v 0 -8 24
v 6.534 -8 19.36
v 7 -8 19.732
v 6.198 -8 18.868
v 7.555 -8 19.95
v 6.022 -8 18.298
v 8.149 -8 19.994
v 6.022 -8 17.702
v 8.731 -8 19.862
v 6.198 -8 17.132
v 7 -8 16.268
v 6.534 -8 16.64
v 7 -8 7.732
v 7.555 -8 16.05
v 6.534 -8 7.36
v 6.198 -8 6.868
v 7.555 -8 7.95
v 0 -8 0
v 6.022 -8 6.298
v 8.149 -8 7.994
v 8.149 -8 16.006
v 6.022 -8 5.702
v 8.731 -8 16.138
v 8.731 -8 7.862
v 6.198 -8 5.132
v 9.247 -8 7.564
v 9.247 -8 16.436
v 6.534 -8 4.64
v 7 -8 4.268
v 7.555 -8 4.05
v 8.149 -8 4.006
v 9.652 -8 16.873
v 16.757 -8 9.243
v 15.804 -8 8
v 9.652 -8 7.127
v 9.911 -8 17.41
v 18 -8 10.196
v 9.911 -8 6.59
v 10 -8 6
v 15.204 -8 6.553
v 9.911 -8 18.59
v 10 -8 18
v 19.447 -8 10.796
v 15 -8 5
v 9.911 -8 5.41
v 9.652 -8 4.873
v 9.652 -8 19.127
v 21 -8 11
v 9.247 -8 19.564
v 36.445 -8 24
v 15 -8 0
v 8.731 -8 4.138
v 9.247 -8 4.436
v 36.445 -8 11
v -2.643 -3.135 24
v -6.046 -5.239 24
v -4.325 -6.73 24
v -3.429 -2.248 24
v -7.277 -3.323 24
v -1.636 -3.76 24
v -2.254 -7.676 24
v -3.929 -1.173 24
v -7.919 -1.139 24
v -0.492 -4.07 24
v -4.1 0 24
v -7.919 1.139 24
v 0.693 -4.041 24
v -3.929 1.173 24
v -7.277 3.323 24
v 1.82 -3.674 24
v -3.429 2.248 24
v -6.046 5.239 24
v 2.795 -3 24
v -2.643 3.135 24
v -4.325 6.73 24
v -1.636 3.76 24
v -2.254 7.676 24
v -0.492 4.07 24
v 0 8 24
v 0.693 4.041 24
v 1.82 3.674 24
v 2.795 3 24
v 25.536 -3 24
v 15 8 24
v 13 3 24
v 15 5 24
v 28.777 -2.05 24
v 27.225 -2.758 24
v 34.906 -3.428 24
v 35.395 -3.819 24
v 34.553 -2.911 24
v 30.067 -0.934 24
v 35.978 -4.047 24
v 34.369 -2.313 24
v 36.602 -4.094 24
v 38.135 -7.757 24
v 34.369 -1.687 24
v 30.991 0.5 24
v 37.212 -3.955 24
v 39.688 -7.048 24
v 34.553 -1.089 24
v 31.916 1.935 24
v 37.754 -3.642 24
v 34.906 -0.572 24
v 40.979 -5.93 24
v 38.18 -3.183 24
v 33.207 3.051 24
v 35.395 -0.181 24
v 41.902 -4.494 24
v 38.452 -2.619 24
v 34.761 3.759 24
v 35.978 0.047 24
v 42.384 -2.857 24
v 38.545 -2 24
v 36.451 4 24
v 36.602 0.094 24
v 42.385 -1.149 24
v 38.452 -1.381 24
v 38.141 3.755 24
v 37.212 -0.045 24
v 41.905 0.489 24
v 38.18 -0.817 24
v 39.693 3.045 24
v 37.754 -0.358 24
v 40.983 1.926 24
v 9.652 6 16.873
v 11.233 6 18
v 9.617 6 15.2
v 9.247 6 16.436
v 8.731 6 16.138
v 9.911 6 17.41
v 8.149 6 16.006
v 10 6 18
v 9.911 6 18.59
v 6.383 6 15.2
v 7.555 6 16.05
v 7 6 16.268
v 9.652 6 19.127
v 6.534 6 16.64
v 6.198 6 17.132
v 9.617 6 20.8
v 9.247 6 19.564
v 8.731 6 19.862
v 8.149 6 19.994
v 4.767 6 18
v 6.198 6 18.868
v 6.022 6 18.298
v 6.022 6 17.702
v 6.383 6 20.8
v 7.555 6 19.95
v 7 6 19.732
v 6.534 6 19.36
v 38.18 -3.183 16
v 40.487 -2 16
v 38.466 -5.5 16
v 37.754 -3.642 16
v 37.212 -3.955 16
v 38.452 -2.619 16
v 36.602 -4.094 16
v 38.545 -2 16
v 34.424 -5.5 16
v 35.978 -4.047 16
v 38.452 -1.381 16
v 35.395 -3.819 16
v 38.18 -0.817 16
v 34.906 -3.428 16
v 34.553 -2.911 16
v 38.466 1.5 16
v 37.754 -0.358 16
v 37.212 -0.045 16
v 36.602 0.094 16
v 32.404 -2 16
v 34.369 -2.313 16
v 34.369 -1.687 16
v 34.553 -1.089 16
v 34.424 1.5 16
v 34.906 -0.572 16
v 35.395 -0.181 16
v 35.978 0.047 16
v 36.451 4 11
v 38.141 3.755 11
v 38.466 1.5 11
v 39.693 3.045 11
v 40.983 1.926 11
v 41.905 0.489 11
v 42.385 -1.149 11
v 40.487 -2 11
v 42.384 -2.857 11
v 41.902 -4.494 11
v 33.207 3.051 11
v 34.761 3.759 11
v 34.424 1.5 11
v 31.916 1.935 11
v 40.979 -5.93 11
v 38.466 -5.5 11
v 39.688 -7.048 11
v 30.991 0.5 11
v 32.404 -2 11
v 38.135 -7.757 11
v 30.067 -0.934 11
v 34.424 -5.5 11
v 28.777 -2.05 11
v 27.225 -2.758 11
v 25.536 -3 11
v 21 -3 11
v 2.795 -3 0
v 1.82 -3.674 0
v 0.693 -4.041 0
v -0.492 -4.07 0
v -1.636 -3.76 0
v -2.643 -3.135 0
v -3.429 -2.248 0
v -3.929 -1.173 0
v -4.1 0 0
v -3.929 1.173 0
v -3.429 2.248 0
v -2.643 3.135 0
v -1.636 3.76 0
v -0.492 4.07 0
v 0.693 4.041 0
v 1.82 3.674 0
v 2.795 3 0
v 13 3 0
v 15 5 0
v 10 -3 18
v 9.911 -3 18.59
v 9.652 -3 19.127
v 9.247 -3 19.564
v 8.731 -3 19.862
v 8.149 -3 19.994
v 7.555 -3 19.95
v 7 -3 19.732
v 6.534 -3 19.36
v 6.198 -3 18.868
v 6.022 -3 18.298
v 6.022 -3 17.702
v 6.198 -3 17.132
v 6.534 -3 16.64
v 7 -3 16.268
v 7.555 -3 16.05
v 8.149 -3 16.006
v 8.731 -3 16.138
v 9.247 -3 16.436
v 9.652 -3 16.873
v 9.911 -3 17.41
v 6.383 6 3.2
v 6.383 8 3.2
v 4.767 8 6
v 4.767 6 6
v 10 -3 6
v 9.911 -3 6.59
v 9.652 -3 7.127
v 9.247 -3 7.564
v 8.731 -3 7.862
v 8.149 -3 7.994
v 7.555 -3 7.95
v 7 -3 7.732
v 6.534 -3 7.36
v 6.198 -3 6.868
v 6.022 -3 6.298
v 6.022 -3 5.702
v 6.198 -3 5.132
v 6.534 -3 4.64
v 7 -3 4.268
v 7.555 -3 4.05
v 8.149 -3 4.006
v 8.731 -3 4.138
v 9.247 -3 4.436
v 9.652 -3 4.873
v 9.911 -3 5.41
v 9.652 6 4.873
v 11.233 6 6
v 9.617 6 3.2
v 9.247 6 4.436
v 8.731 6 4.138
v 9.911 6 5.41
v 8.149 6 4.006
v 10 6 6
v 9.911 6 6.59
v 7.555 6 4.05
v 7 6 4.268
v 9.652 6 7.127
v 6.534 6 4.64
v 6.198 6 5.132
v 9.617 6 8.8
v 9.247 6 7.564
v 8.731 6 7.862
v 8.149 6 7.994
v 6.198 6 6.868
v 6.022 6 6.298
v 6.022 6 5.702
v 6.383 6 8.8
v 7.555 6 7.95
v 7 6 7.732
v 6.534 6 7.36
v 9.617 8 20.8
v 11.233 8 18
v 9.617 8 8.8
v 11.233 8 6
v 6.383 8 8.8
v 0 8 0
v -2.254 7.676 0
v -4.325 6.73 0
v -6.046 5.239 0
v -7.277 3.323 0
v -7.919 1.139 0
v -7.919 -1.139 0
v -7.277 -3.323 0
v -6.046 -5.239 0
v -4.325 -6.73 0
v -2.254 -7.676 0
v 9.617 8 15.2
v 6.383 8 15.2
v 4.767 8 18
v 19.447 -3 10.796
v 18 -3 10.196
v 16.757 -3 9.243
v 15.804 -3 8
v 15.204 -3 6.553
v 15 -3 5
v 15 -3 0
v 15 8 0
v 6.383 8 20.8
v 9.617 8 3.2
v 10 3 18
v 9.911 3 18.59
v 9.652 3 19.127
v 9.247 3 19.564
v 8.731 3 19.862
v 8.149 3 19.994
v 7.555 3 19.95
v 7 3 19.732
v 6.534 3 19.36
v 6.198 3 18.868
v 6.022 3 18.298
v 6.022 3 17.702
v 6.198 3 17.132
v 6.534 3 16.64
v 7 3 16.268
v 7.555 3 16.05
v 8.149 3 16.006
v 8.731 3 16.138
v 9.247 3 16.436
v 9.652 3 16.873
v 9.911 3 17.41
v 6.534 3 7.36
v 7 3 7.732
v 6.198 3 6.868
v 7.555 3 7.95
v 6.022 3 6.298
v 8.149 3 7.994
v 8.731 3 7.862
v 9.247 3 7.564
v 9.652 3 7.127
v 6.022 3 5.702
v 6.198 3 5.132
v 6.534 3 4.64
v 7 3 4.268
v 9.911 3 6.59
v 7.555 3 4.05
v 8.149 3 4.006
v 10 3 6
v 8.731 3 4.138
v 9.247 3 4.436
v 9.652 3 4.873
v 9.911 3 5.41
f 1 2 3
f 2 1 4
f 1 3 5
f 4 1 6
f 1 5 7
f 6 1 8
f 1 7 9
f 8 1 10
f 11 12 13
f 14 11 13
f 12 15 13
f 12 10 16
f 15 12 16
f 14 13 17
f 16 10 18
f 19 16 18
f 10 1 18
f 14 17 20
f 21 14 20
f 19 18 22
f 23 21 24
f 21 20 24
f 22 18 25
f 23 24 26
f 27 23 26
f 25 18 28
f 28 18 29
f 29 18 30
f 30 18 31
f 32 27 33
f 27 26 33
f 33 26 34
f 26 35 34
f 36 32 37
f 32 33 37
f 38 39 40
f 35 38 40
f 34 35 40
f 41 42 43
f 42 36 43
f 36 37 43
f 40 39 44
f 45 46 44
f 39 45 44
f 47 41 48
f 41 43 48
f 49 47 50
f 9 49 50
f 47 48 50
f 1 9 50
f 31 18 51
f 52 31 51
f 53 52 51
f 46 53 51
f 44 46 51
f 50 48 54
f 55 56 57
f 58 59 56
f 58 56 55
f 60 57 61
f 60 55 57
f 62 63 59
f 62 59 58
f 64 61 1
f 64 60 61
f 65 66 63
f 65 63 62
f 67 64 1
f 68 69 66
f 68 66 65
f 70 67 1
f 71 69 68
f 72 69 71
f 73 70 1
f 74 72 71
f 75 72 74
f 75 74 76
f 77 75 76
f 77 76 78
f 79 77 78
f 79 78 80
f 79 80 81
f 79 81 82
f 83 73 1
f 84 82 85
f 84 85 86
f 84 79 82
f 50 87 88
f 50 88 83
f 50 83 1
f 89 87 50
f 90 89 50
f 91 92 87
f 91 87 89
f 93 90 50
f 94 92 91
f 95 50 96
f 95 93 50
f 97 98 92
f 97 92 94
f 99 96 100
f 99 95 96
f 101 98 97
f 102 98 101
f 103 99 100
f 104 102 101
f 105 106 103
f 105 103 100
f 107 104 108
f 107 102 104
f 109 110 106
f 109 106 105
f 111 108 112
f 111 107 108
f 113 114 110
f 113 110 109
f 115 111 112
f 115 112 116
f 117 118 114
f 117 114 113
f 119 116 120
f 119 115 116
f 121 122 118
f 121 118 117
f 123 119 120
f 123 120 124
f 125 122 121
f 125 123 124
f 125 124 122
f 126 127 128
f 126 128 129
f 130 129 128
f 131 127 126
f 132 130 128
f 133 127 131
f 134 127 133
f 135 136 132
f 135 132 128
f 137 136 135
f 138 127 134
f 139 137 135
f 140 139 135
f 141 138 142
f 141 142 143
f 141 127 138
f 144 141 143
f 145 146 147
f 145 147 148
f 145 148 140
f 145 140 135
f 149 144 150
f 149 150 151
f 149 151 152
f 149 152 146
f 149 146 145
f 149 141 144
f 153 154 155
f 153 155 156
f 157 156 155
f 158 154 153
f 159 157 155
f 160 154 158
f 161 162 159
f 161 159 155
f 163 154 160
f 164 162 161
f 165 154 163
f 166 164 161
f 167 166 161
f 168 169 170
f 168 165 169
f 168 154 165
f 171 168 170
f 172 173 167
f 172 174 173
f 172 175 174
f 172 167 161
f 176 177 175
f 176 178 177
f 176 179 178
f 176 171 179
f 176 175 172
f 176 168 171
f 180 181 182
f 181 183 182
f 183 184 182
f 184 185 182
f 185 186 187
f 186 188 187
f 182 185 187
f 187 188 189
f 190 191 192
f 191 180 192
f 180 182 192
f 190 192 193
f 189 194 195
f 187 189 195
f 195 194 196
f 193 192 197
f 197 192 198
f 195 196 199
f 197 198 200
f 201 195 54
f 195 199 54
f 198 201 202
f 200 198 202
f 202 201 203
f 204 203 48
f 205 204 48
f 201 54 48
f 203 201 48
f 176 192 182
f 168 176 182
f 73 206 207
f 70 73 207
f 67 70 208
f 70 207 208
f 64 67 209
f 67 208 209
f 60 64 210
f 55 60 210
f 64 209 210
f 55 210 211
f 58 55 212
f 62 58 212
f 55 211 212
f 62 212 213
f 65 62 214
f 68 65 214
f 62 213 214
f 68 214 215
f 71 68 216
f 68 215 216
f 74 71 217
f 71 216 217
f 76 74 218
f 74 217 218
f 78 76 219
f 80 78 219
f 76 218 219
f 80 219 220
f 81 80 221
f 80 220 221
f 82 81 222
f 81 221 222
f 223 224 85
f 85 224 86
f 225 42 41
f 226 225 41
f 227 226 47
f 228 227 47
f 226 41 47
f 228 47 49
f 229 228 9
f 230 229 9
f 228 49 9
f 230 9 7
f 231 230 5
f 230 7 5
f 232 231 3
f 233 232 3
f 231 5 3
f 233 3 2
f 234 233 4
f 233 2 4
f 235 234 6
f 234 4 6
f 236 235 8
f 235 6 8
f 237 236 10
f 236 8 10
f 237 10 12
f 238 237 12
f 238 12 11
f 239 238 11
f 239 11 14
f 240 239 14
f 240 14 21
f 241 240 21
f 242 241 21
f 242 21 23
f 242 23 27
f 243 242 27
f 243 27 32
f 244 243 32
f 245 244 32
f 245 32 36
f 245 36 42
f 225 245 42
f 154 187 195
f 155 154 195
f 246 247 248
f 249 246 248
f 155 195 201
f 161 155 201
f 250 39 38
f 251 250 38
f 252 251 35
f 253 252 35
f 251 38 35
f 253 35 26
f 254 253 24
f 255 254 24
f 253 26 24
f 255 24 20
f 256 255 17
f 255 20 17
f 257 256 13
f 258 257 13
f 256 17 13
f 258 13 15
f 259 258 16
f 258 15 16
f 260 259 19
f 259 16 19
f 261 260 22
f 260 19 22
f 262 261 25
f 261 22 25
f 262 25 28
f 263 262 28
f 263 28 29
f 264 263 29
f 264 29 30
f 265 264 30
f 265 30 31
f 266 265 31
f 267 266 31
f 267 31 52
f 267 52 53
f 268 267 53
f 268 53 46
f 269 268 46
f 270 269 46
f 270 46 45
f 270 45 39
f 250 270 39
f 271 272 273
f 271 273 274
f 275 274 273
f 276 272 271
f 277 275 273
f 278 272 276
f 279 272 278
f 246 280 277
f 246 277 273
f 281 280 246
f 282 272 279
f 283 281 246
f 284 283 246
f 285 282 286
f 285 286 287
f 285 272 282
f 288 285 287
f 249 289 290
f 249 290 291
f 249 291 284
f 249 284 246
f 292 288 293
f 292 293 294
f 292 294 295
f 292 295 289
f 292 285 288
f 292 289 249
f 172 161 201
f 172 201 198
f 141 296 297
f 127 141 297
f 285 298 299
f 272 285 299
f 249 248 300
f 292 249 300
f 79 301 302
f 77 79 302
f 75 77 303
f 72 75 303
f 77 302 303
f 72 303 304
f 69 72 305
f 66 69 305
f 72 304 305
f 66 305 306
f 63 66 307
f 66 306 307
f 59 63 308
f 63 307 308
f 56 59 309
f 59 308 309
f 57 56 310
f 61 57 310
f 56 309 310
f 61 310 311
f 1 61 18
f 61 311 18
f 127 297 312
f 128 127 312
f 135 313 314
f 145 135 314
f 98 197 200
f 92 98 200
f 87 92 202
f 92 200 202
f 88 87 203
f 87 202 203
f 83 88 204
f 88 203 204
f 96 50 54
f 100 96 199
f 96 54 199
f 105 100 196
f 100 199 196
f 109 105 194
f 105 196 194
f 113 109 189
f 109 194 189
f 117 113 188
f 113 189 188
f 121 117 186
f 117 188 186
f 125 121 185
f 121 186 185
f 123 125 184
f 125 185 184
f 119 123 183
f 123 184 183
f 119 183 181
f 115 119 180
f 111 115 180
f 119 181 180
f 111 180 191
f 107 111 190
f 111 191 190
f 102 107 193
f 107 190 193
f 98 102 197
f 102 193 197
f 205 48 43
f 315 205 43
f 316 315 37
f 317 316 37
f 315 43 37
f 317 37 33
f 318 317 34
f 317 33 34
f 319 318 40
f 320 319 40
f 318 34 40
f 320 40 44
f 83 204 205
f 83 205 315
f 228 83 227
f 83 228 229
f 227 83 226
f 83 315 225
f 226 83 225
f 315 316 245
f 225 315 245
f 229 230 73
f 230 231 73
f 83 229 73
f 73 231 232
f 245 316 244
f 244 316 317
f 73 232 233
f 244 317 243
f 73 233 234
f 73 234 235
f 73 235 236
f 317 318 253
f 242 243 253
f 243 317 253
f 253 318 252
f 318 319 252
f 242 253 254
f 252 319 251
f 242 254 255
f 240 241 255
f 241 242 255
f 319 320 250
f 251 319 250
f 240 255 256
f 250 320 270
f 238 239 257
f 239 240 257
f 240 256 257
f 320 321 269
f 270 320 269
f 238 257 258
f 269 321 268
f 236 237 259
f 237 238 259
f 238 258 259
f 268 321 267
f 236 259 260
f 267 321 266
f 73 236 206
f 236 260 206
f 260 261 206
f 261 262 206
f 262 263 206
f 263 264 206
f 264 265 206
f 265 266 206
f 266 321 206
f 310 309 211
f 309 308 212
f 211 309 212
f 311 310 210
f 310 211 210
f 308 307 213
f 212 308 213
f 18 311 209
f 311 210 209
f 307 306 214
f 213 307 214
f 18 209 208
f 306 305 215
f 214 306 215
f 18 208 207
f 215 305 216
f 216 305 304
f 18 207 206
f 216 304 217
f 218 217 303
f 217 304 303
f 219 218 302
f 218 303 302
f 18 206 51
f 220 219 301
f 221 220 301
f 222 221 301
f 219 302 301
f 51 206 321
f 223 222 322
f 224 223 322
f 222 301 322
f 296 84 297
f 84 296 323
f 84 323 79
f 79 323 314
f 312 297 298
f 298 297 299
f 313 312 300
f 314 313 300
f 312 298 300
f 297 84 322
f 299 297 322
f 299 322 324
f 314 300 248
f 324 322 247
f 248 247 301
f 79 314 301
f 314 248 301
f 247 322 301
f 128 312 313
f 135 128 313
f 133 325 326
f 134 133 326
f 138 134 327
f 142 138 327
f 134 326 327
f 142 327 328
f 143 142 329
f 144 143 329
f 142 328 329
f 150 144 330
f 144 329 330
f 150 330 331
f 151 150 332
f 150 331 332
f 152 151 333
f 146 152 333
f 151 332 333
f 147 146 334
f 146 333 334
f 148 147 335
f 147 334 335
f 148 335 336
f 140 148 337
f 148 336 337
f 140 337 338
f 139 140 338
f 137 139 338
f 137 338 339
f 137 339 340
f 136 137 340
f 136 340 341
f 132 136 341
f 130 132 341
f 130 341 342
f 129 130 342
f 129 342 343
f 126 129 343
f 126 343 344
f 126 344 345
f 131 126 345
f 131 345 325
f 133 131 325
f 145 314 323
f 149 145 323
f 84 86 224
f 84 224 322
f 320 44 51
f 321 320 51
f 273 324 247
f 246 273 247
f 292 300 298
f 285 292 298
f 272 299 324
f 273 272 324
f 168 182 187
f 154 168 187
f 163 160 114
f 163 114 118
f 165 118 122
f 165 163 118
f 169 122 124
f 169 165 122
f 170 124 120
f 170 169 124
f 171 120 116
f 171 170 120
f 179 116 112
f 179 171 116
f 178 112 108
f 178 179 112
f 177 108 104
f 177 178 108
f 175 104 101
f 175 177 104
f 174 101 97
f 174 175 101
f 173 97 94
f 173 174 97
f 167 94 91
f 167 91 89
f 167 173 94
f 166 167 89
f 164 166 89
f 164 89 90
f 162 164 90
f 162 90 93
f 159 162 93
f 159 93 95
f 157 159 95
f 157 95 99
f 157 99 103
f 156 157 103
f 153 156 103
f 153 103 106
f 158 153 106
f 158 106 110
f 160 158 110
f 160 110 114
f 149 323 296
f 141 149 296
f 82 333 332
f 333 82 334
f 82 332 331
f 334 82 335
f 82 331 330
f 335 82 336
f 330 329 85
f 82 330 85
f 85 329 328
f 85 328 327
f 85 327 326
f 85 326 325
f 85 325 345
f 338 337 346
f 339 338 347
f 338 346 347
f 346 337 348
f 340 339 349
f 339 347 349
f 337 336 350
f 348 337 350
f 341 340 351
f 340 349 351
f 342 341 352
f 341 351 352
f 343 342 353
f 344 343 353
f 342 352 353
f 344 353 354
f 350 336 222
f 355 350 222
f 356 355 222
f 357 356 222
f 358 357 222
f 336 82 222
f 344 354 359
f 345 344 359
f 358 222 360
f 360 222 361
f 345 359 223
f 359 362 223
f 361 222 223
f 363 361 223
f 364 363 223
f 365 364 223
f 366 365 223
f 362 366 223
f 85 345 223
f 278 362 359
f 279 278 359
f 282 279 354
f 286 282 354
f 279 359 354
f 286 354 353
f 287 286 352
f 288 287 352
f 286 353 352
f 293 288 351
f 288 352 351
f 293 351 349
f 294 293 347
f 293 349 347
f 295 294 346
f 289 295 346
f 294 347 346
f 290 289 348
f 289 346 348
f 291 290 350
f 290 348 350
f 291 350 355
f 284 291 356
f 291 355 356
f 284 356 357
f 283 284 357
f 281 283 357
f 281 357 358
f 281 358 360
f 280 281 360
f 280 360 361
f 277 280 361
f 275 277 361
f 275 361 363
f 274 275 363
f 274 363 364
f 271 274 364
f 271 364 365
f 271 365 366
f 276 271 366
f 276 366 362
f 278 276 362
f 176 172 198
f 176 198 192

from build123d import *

# Parameters (mm, degrees)
SKETCH1_R           = 2.1
BOSS_EXTRUDE1_DEPTH = 24
SKETCH2_R           = 2
CUT_EXTRUDE1_DEPTH  = 17
CUT_EXTRUDE2_DEPTH  = 2
CUT_EXTRUDE3_DEPTH  = 5
CHAMFER1_SIZE       = 2


with BuildPart() as part:
    # Sketch1 → Boss-Extrude1 (new body)
    with BuildSketch(Plane.XY):
        with BuildLine():
            Line((2.794637722, 3), (15, 3))
            Line((15, 3), (15, 8))
            Line((15, 8), (0, 8))
            ThreePointArc((0, 8), (-8, 0), (0, -8))
            Line((0, -8), (36.445164288, -8))
            ThreePointArc((36.445164288, -8), (41.494916757, 1.240370349), (30.990808231, 0.5))
            ThreePointArc((30.990808231, 0.5), (28.776822523, -2.049752469), (25.536452174, -3))
            Line((25.536452174, -3), (2.794637722, -3))
            ThreePointArc((2.794637722, -3), (-4.1, 0), (2.794637722, 3))
        make_face()
        with Locations((36.445164288, -2)):
            Circle(SKETCH1_R, mode=Mode.SUBTRACT)
    extrude(amount=BOSS_EXTRUDE1_DEPTH)

    # Sketch2 → Cut-Extrude1 (cut, through all)
    with BuildSketch(Plane.XZ.offset(8)):
        with Locations((8, 18)):
            Circle(SKETCH2_R)
        with Locations((8, 6)):
            Circle(SKETCH2_R)
        with BuildLine():
            Line((15, 5), (15, 0))
            Line((15, 0), (45.871149595, 0))
            Line((45.871149595, 0), (45.871149595, 11))
            Line((45.871149595, 11), (21, 11))
            ThreePointArc((21, 11), (16.757359313, 9.242640687), (15, 5))
        make_face()
    extrude(amount=-CUT_EXTRUDE1_DEPTH, mode=Mode.SUBTRACT)

    # Sketch3 → Cut-Extrude2 (cut)
    with BuildSketch(Plane(origin=(0, 8, 0), x_dir=(-1, 0, 0), z_dir=(0, 1, 0))):
        Polygon((-9.616580754, 8.8), (-11.233161507, 6), (-9.616580754, 3.2), (-6.383419246, 3.2), (-4.766838493, 6), (-6.383419246, 8.8), align=None)
        Polygon((-9.616580754, 20.8), (-11.233161507, 18), (-9.616580754, 15.2), (-6.383419246, 15.2), (-4.766838493, 18), (-6.383419246, 20.8), align=None)
    extrude(amount=-CUT_EXTRUDE2_DEPTH, mode=Mode.SUBTRACT)

    # Sketch4 → Cut-Extrude3 (cut)
    with BuildSketch(Plane(origin=(0, 0, 11), x_dir=(-1, 0, 0), z_dir=(0, 0, -1))):
        Polygon((-34.424438346, 1.5), (-38.46589023, 1.5), (-40.486616173, -2), (-38.46589023, -5.5), (-34.424438346, -5.5), (-32.403712404, -2), align=None)
    extrude(amount=-CUT_EXTRUDE3_DEPTH, mode=Mode.SUBTRACT)

    # Chamfer1
    chamfer1_edges = [part.edges().sort_by_distance(p)[0] for p in [
        (15, 3, 12),
    ]]
    chamfer(chamfer1_edges, length=CHAMFER1_SIZE)


solid = part.part
